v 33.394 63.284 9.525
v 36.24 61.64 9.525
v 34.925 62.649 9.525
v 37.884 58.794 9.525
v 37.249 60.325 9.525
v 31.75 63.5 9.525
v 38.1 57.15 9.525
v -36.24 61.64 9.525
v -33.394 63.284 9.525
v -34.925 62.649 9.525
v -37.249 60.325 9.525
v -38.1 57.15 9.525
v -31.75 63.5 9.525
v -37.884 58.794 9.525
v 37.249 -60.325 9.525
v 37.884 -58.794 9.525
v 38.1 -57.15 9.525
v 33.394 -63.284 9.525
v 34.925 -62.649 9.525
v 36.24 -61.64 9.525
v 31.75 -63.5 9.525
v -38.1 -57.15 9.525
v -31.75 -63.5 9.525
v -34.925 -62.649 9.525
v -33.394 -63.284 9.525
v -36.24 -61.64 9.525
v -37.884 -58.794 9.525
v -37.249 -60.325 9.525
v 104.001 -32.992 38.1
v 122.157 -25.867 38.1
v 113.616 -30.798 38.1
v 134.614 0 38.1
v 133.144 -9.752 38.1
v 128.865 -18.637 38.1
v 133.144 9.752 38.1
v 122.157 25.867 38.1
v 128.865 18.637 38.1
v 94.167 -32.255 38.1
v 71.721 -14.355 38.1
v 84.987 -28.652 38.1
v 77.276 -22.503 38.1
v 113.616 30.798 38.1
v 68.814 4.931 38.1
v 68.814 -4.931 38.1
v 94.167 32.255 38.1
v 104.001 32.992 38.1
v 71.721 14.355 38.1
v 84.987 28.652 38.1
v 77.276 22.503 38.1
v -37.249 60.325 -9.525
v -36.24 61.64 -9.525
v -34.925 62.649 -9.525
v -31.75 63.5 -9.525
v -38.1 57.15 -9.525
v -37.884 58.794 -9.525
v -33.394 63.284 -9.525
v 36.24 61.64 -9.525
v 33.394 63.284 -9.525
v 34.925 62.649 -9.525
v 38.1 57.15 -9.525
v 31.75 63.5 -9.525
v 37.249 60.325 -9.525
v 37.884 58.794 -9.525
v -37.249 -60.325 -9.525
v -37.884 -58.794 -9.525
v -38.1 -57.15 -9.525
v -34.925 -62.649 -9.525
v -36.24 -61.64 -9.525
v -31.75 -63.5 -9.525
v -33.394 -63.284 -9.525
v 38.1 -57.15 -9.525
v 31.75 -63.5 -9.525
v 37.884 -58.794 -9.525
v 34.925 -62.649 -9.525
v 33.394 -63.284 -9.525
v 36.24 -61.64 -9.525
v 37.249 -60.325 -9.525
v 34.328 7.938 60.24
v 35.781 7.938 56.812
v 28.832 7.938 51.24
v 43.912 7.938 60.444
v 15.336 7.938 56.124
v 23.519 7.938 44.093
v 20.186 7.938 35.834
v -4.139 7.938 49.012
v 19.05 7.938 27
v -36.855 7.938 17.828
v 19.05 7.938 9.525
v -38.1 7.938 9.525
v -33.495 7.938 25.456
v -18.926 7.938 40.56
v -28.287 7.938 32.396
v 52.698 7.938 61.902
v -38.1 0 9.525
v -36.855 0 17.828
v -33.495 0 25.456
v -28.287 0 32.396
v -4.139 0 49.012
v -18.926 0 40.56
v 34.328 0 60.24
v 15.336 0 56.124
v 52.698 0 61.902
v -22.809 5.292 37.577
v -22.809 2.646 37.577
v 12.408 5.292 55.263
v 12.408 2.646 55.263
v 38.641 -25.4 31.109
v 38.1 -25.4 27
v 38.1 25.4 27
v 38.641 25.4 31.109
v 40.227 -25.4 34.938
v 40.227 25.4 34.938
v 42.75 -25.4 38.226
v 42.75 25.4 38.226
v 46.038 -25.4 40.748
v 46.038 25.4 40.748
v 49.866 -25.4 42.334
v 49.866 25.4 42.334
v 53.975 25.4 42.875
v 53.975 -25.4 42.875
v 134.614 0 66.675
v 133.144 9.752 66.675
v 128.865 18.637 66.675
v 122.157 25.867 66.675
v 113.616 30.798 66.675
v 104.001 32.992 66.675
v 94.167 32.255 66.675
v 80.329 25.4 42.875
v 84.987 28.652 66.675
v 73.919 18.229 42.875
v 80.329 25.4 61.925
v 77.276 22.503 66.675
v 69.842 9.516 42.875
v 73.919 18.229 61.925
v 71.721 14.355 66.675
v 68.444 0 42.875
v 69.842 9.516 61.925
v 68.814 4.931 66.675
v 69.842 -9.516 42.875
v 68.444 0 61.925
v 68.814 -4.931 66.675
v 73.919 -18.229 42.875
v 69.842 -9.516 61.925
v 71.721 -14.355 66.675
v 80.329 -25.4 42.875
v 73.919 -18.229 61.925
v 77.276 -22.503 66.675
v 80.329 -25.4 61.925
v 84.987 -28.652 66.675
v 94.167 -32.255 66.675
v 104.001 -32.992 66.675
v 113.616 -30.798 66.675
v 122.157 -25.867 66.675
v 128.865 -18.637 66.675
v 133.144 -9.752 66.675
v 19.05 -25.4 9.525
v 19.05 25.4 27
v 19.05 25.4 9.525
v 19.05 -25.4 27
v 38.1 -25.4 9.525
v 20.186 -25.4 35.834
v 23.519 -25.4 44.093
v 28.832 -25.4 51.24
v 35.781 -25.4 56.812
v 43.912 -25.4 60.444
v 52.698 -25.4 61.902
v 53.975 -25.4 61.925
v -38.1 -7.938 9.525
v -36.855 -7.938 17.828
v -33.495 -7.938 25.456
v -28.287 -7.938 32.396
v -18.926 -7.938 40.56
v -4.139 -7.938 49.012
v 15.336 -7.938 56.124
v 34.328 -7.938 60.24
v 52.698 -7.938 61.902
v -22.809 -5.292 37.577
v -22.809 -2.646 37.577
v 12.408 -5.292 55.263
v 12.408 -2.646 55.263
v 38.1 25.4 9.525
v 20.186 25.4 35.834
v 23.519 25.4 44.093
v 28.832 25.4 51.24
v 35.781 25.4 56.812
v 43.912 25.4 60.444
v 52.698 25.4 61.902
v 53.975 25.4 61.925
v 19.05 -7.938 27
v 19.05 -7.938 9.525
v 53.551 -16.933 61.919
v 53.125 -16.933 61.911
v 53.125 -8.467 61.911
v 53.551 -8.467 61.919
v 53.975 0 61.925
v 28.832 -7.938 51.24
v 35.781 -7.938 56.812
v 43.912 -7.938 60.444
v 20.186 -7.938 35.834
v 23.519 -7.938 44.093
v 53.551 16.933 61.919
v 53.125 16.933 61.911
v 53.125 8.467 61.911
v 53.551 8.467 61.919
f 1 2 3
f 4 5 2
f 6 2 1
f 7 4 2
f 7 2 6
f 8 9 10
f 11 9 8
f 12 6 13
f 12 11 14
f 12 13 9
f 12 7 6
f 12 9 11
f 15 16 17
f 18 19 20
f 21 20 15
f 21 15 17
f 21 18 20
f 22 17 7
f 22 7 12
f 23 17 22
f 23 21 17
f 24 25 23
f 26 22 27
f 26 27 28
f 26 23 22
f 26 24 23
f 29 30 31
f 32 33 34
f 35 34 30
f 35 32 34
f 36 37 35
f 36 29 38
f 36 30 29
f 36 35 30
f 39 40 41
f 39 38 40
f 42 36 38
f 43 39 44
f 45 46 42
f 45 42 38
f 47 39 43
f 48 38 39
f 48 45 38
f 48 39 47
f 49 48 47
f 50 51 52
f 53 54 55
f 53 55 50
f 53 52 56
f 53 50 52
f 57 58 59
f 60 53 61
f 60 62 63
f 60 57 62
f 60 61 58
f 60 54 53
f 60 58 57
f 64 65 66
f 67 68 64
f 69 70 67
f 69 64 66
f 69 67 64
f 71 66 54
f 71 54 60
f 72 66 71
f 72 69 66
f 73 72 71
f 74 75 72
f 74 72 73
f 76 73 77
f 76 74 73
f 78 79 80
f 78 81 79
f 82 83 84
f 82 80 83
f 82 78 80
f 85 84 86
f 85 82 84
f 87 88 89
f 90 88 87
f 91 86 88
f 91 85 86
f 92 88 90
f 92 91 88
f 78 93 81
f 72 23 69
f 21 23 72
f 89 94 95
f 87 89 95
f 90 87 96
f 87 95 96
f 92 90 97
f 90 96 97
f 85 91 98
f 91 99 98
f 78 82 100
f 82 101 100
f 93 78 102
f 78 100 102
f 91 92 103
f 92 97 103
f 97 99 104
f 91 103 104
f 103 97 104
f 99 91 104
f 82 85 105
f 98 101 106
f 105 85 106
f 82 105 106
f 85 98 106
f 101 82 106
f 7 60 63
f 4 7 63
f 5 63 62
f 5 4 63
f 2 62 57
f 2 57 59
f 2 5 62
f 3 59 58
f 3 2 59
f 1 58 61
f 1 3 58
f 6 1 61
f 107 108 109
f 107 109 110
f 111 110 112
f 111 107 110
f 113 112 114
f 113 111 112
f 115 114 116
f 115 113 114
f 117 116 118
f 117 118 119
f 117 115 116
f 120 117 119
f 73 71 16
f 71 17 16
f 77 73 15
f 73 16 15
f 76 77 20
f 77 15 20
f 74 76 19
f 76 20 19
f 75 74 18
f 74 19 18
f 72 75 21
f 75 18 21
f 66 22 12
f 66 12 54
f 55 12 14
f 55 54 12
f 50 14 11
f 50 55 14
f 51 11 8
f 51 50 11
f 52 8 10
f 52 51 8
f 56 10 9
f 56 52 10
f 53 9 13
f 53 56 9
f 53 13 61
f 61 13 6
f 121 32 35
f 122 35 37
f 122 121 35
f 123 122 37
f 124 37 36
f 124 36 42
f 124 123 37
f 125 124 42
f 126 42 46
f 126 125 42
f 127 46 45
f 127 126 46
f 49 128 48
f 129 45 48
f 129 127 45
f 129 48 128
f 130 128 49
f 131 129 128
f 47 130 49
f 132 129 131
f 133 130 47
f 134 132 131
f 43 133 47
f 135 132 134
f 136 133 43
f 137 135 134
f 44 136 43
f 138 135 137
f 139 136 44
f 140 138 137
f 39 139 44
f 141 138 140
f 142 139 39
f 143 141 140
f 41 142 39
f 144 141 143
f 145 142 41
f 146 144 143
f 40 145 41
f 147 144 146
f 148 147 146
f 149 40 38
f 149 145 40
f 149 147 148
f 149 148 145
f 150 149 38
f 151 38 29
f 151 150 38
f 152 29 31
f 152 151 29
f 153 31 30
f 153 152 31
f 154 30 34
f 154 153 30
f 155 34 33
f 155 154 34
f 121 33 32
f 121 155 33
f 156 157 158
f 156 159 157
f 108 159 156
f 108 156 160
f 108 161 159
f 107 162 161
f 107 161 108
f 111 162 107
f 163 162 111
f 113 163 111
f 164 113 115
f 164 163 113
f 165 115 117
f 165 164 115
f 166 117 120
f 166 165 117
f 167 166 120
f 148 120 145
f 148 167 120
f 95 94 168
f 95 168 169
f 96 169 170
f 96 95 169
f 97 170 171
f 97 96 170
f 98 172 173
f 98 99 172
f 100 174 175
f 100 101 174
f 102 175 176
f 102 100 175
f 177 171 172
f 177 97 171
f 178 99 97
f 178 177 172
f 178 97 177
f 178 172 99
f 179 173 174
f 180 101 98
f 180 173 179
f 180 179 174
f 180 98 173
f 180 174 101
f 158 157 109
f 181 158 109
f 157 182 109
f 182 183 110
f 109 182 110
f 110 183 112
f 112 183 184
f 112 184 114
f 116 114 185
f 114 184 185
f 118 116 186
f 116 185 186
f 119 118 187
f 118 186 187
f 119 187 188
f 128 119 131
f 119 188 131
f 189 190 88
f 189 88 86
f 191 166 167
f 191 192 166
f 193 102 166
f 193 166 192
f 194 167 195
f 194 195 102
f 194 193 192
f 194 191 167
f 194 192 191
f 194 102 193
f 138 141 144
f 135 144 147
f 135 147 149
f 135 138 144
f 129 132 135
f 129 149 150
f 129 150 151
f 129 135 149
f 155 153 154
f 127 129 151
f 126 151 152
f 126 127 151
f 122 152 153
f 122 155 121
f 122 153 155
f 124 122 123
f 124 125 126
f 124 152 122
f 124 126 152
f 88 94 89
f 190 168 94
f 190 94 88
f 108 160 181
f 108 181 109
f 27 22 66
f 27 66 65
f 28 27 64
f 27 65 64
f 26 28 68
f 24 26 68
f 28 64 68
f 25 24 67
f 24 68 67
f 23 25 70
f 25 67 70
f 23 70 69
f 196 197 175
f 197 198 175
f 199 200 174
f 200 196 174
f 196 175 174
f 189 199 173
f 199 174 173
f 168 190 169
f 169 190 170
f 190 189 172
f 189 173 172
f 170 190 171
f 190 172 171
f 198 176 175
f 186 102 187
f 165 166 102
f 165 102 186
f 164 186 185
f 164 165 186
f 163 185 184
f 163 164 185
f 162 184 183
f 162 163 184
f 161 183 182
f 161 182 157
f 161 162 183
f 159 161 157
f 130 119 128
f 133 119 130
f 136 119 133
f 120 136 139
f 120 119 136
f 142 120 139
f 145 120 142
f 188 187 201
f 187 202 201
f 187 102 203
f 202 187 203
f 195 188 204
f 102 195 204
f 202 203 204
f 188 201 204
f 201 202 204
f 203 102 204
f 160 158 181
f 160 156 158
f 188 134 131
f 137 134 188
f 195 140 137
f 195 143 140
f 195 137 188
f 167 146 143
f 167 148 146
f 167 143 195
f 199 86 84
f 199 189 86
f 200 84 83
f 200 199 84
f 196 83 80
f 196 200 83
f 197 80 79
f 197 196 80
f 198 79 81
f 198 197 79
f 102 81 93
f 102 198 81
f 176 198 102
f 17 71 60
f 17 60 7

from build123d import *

# Parameters (mm, degrees)
F1_DEPTH = 63.5
F0_W     = 17.715069
F0_H     = 4.7752
F2_DEPTH = 25.4
F3_DEPTH = 7.9375
F5_R     = 6.35


with BuildPart() as f1:
    # F0 (on Front) → F1 (new body, symmetric)
    with BuildSketch(Plane.XZ):
        Polygon((-38.1, 9.525), (-38.1, -9.525), (38.1, -9.525), (38.1, 9.525), (19.05, 9.525), align=None)
    extrude(amount=F1_DEPTH, both=True)

    # F5
    f5_edges = [f1.edges().sort_by_distance(p)[0] for p in [
        (-38.1, -63.5, 0),
        (38.1, -63.5, 0),
        (-38.1, 63.5, 0),
        (38.1, 63.5, 0),
    ]]
    fillet(f5_edges, radius=F5_R)


with BuildPart() as f2:
    # F0 (on Front) → F2 (new body, symmetric)
    with BuildSketch(Plane.XZ):
        with Locations((92.671515, 40.4876)):
            Rectangle(F0_W, F0_H)
        with BuildLine():
            Line((19.05, 9.525), (38.1, 9.525))
            Line((38.1, 9.525), (38.1, 27.0002))
            ThreePointArc((38.1, 27.0002), (42.74968, 38.22552), (53.975, 42.8752))
            Line((53.975, 42.8752), (83.81398, 42.8752))
            Line((83.81398, 42.8752), (83.81398, 61.9252))
            Line((83.81398, 61.9252), (53.975, 61.9252))
            add(Edge.make_bspline(
                [(52.698431, 61.901862), (53.125853, 61.911883), (53.551409, 61.919664), (53.975, 61.9252)],
                knots=[104.759284, 104.759284, 104.759284, 104.759284, 105.94143, 105.94143, 105.94143, 105.94143], degree=3))
            ThreePointArc((52.698431, 61.901862), (28.832011, 51.240367), (19.05, 27.0002))
            Line((19.05, 27.0002), (19.05, 9.525))
        make_face()
    extrude(amount=F2_DEPTH, both=True)

    # F0 (on Front) → F4 (revolve)
    with BuildSketch(Plane.XZ):
        Polygon((101.529049, 66.675), (101.529049, 61.9252), (101.529049, 42.8752), (101.529049, 38.1), (134.61398, 38.1), (134.61398, 66.675), align=None)
    revolve(axis=Axis((101.529049, 0, 52.3875), (0, 0, 1)))


with BuildPart() as f3:
    # F0 (on Front) → F3 (new body, symmetric)
    with BuildSketch(Plane.XZ):
        with BuildLine():
            add(Edge.make_bspline(
                [(-38.1, 9.525), (-37.722898, 42.532326), (14.821118, 61.013806), (52.698431, 61.901862)],
                knots=[0, 0, 0, 0, 104.759284, 104.759284, 104.759284, 104.759284], degree=3))
            Line((-38.1, 9.525), (19.05, 9.525))
            Line((19.05, 9.525), (19.05, 27.0002))
            ThreePointArc((19.05, 27.0002), (28.832011, 51.240367), (52.698431, 61.901862))
        make_face()
    extrude(amount=F3_DEPTH, both=True)


solid = Compound([f1.part, f2.part, f3.part])
